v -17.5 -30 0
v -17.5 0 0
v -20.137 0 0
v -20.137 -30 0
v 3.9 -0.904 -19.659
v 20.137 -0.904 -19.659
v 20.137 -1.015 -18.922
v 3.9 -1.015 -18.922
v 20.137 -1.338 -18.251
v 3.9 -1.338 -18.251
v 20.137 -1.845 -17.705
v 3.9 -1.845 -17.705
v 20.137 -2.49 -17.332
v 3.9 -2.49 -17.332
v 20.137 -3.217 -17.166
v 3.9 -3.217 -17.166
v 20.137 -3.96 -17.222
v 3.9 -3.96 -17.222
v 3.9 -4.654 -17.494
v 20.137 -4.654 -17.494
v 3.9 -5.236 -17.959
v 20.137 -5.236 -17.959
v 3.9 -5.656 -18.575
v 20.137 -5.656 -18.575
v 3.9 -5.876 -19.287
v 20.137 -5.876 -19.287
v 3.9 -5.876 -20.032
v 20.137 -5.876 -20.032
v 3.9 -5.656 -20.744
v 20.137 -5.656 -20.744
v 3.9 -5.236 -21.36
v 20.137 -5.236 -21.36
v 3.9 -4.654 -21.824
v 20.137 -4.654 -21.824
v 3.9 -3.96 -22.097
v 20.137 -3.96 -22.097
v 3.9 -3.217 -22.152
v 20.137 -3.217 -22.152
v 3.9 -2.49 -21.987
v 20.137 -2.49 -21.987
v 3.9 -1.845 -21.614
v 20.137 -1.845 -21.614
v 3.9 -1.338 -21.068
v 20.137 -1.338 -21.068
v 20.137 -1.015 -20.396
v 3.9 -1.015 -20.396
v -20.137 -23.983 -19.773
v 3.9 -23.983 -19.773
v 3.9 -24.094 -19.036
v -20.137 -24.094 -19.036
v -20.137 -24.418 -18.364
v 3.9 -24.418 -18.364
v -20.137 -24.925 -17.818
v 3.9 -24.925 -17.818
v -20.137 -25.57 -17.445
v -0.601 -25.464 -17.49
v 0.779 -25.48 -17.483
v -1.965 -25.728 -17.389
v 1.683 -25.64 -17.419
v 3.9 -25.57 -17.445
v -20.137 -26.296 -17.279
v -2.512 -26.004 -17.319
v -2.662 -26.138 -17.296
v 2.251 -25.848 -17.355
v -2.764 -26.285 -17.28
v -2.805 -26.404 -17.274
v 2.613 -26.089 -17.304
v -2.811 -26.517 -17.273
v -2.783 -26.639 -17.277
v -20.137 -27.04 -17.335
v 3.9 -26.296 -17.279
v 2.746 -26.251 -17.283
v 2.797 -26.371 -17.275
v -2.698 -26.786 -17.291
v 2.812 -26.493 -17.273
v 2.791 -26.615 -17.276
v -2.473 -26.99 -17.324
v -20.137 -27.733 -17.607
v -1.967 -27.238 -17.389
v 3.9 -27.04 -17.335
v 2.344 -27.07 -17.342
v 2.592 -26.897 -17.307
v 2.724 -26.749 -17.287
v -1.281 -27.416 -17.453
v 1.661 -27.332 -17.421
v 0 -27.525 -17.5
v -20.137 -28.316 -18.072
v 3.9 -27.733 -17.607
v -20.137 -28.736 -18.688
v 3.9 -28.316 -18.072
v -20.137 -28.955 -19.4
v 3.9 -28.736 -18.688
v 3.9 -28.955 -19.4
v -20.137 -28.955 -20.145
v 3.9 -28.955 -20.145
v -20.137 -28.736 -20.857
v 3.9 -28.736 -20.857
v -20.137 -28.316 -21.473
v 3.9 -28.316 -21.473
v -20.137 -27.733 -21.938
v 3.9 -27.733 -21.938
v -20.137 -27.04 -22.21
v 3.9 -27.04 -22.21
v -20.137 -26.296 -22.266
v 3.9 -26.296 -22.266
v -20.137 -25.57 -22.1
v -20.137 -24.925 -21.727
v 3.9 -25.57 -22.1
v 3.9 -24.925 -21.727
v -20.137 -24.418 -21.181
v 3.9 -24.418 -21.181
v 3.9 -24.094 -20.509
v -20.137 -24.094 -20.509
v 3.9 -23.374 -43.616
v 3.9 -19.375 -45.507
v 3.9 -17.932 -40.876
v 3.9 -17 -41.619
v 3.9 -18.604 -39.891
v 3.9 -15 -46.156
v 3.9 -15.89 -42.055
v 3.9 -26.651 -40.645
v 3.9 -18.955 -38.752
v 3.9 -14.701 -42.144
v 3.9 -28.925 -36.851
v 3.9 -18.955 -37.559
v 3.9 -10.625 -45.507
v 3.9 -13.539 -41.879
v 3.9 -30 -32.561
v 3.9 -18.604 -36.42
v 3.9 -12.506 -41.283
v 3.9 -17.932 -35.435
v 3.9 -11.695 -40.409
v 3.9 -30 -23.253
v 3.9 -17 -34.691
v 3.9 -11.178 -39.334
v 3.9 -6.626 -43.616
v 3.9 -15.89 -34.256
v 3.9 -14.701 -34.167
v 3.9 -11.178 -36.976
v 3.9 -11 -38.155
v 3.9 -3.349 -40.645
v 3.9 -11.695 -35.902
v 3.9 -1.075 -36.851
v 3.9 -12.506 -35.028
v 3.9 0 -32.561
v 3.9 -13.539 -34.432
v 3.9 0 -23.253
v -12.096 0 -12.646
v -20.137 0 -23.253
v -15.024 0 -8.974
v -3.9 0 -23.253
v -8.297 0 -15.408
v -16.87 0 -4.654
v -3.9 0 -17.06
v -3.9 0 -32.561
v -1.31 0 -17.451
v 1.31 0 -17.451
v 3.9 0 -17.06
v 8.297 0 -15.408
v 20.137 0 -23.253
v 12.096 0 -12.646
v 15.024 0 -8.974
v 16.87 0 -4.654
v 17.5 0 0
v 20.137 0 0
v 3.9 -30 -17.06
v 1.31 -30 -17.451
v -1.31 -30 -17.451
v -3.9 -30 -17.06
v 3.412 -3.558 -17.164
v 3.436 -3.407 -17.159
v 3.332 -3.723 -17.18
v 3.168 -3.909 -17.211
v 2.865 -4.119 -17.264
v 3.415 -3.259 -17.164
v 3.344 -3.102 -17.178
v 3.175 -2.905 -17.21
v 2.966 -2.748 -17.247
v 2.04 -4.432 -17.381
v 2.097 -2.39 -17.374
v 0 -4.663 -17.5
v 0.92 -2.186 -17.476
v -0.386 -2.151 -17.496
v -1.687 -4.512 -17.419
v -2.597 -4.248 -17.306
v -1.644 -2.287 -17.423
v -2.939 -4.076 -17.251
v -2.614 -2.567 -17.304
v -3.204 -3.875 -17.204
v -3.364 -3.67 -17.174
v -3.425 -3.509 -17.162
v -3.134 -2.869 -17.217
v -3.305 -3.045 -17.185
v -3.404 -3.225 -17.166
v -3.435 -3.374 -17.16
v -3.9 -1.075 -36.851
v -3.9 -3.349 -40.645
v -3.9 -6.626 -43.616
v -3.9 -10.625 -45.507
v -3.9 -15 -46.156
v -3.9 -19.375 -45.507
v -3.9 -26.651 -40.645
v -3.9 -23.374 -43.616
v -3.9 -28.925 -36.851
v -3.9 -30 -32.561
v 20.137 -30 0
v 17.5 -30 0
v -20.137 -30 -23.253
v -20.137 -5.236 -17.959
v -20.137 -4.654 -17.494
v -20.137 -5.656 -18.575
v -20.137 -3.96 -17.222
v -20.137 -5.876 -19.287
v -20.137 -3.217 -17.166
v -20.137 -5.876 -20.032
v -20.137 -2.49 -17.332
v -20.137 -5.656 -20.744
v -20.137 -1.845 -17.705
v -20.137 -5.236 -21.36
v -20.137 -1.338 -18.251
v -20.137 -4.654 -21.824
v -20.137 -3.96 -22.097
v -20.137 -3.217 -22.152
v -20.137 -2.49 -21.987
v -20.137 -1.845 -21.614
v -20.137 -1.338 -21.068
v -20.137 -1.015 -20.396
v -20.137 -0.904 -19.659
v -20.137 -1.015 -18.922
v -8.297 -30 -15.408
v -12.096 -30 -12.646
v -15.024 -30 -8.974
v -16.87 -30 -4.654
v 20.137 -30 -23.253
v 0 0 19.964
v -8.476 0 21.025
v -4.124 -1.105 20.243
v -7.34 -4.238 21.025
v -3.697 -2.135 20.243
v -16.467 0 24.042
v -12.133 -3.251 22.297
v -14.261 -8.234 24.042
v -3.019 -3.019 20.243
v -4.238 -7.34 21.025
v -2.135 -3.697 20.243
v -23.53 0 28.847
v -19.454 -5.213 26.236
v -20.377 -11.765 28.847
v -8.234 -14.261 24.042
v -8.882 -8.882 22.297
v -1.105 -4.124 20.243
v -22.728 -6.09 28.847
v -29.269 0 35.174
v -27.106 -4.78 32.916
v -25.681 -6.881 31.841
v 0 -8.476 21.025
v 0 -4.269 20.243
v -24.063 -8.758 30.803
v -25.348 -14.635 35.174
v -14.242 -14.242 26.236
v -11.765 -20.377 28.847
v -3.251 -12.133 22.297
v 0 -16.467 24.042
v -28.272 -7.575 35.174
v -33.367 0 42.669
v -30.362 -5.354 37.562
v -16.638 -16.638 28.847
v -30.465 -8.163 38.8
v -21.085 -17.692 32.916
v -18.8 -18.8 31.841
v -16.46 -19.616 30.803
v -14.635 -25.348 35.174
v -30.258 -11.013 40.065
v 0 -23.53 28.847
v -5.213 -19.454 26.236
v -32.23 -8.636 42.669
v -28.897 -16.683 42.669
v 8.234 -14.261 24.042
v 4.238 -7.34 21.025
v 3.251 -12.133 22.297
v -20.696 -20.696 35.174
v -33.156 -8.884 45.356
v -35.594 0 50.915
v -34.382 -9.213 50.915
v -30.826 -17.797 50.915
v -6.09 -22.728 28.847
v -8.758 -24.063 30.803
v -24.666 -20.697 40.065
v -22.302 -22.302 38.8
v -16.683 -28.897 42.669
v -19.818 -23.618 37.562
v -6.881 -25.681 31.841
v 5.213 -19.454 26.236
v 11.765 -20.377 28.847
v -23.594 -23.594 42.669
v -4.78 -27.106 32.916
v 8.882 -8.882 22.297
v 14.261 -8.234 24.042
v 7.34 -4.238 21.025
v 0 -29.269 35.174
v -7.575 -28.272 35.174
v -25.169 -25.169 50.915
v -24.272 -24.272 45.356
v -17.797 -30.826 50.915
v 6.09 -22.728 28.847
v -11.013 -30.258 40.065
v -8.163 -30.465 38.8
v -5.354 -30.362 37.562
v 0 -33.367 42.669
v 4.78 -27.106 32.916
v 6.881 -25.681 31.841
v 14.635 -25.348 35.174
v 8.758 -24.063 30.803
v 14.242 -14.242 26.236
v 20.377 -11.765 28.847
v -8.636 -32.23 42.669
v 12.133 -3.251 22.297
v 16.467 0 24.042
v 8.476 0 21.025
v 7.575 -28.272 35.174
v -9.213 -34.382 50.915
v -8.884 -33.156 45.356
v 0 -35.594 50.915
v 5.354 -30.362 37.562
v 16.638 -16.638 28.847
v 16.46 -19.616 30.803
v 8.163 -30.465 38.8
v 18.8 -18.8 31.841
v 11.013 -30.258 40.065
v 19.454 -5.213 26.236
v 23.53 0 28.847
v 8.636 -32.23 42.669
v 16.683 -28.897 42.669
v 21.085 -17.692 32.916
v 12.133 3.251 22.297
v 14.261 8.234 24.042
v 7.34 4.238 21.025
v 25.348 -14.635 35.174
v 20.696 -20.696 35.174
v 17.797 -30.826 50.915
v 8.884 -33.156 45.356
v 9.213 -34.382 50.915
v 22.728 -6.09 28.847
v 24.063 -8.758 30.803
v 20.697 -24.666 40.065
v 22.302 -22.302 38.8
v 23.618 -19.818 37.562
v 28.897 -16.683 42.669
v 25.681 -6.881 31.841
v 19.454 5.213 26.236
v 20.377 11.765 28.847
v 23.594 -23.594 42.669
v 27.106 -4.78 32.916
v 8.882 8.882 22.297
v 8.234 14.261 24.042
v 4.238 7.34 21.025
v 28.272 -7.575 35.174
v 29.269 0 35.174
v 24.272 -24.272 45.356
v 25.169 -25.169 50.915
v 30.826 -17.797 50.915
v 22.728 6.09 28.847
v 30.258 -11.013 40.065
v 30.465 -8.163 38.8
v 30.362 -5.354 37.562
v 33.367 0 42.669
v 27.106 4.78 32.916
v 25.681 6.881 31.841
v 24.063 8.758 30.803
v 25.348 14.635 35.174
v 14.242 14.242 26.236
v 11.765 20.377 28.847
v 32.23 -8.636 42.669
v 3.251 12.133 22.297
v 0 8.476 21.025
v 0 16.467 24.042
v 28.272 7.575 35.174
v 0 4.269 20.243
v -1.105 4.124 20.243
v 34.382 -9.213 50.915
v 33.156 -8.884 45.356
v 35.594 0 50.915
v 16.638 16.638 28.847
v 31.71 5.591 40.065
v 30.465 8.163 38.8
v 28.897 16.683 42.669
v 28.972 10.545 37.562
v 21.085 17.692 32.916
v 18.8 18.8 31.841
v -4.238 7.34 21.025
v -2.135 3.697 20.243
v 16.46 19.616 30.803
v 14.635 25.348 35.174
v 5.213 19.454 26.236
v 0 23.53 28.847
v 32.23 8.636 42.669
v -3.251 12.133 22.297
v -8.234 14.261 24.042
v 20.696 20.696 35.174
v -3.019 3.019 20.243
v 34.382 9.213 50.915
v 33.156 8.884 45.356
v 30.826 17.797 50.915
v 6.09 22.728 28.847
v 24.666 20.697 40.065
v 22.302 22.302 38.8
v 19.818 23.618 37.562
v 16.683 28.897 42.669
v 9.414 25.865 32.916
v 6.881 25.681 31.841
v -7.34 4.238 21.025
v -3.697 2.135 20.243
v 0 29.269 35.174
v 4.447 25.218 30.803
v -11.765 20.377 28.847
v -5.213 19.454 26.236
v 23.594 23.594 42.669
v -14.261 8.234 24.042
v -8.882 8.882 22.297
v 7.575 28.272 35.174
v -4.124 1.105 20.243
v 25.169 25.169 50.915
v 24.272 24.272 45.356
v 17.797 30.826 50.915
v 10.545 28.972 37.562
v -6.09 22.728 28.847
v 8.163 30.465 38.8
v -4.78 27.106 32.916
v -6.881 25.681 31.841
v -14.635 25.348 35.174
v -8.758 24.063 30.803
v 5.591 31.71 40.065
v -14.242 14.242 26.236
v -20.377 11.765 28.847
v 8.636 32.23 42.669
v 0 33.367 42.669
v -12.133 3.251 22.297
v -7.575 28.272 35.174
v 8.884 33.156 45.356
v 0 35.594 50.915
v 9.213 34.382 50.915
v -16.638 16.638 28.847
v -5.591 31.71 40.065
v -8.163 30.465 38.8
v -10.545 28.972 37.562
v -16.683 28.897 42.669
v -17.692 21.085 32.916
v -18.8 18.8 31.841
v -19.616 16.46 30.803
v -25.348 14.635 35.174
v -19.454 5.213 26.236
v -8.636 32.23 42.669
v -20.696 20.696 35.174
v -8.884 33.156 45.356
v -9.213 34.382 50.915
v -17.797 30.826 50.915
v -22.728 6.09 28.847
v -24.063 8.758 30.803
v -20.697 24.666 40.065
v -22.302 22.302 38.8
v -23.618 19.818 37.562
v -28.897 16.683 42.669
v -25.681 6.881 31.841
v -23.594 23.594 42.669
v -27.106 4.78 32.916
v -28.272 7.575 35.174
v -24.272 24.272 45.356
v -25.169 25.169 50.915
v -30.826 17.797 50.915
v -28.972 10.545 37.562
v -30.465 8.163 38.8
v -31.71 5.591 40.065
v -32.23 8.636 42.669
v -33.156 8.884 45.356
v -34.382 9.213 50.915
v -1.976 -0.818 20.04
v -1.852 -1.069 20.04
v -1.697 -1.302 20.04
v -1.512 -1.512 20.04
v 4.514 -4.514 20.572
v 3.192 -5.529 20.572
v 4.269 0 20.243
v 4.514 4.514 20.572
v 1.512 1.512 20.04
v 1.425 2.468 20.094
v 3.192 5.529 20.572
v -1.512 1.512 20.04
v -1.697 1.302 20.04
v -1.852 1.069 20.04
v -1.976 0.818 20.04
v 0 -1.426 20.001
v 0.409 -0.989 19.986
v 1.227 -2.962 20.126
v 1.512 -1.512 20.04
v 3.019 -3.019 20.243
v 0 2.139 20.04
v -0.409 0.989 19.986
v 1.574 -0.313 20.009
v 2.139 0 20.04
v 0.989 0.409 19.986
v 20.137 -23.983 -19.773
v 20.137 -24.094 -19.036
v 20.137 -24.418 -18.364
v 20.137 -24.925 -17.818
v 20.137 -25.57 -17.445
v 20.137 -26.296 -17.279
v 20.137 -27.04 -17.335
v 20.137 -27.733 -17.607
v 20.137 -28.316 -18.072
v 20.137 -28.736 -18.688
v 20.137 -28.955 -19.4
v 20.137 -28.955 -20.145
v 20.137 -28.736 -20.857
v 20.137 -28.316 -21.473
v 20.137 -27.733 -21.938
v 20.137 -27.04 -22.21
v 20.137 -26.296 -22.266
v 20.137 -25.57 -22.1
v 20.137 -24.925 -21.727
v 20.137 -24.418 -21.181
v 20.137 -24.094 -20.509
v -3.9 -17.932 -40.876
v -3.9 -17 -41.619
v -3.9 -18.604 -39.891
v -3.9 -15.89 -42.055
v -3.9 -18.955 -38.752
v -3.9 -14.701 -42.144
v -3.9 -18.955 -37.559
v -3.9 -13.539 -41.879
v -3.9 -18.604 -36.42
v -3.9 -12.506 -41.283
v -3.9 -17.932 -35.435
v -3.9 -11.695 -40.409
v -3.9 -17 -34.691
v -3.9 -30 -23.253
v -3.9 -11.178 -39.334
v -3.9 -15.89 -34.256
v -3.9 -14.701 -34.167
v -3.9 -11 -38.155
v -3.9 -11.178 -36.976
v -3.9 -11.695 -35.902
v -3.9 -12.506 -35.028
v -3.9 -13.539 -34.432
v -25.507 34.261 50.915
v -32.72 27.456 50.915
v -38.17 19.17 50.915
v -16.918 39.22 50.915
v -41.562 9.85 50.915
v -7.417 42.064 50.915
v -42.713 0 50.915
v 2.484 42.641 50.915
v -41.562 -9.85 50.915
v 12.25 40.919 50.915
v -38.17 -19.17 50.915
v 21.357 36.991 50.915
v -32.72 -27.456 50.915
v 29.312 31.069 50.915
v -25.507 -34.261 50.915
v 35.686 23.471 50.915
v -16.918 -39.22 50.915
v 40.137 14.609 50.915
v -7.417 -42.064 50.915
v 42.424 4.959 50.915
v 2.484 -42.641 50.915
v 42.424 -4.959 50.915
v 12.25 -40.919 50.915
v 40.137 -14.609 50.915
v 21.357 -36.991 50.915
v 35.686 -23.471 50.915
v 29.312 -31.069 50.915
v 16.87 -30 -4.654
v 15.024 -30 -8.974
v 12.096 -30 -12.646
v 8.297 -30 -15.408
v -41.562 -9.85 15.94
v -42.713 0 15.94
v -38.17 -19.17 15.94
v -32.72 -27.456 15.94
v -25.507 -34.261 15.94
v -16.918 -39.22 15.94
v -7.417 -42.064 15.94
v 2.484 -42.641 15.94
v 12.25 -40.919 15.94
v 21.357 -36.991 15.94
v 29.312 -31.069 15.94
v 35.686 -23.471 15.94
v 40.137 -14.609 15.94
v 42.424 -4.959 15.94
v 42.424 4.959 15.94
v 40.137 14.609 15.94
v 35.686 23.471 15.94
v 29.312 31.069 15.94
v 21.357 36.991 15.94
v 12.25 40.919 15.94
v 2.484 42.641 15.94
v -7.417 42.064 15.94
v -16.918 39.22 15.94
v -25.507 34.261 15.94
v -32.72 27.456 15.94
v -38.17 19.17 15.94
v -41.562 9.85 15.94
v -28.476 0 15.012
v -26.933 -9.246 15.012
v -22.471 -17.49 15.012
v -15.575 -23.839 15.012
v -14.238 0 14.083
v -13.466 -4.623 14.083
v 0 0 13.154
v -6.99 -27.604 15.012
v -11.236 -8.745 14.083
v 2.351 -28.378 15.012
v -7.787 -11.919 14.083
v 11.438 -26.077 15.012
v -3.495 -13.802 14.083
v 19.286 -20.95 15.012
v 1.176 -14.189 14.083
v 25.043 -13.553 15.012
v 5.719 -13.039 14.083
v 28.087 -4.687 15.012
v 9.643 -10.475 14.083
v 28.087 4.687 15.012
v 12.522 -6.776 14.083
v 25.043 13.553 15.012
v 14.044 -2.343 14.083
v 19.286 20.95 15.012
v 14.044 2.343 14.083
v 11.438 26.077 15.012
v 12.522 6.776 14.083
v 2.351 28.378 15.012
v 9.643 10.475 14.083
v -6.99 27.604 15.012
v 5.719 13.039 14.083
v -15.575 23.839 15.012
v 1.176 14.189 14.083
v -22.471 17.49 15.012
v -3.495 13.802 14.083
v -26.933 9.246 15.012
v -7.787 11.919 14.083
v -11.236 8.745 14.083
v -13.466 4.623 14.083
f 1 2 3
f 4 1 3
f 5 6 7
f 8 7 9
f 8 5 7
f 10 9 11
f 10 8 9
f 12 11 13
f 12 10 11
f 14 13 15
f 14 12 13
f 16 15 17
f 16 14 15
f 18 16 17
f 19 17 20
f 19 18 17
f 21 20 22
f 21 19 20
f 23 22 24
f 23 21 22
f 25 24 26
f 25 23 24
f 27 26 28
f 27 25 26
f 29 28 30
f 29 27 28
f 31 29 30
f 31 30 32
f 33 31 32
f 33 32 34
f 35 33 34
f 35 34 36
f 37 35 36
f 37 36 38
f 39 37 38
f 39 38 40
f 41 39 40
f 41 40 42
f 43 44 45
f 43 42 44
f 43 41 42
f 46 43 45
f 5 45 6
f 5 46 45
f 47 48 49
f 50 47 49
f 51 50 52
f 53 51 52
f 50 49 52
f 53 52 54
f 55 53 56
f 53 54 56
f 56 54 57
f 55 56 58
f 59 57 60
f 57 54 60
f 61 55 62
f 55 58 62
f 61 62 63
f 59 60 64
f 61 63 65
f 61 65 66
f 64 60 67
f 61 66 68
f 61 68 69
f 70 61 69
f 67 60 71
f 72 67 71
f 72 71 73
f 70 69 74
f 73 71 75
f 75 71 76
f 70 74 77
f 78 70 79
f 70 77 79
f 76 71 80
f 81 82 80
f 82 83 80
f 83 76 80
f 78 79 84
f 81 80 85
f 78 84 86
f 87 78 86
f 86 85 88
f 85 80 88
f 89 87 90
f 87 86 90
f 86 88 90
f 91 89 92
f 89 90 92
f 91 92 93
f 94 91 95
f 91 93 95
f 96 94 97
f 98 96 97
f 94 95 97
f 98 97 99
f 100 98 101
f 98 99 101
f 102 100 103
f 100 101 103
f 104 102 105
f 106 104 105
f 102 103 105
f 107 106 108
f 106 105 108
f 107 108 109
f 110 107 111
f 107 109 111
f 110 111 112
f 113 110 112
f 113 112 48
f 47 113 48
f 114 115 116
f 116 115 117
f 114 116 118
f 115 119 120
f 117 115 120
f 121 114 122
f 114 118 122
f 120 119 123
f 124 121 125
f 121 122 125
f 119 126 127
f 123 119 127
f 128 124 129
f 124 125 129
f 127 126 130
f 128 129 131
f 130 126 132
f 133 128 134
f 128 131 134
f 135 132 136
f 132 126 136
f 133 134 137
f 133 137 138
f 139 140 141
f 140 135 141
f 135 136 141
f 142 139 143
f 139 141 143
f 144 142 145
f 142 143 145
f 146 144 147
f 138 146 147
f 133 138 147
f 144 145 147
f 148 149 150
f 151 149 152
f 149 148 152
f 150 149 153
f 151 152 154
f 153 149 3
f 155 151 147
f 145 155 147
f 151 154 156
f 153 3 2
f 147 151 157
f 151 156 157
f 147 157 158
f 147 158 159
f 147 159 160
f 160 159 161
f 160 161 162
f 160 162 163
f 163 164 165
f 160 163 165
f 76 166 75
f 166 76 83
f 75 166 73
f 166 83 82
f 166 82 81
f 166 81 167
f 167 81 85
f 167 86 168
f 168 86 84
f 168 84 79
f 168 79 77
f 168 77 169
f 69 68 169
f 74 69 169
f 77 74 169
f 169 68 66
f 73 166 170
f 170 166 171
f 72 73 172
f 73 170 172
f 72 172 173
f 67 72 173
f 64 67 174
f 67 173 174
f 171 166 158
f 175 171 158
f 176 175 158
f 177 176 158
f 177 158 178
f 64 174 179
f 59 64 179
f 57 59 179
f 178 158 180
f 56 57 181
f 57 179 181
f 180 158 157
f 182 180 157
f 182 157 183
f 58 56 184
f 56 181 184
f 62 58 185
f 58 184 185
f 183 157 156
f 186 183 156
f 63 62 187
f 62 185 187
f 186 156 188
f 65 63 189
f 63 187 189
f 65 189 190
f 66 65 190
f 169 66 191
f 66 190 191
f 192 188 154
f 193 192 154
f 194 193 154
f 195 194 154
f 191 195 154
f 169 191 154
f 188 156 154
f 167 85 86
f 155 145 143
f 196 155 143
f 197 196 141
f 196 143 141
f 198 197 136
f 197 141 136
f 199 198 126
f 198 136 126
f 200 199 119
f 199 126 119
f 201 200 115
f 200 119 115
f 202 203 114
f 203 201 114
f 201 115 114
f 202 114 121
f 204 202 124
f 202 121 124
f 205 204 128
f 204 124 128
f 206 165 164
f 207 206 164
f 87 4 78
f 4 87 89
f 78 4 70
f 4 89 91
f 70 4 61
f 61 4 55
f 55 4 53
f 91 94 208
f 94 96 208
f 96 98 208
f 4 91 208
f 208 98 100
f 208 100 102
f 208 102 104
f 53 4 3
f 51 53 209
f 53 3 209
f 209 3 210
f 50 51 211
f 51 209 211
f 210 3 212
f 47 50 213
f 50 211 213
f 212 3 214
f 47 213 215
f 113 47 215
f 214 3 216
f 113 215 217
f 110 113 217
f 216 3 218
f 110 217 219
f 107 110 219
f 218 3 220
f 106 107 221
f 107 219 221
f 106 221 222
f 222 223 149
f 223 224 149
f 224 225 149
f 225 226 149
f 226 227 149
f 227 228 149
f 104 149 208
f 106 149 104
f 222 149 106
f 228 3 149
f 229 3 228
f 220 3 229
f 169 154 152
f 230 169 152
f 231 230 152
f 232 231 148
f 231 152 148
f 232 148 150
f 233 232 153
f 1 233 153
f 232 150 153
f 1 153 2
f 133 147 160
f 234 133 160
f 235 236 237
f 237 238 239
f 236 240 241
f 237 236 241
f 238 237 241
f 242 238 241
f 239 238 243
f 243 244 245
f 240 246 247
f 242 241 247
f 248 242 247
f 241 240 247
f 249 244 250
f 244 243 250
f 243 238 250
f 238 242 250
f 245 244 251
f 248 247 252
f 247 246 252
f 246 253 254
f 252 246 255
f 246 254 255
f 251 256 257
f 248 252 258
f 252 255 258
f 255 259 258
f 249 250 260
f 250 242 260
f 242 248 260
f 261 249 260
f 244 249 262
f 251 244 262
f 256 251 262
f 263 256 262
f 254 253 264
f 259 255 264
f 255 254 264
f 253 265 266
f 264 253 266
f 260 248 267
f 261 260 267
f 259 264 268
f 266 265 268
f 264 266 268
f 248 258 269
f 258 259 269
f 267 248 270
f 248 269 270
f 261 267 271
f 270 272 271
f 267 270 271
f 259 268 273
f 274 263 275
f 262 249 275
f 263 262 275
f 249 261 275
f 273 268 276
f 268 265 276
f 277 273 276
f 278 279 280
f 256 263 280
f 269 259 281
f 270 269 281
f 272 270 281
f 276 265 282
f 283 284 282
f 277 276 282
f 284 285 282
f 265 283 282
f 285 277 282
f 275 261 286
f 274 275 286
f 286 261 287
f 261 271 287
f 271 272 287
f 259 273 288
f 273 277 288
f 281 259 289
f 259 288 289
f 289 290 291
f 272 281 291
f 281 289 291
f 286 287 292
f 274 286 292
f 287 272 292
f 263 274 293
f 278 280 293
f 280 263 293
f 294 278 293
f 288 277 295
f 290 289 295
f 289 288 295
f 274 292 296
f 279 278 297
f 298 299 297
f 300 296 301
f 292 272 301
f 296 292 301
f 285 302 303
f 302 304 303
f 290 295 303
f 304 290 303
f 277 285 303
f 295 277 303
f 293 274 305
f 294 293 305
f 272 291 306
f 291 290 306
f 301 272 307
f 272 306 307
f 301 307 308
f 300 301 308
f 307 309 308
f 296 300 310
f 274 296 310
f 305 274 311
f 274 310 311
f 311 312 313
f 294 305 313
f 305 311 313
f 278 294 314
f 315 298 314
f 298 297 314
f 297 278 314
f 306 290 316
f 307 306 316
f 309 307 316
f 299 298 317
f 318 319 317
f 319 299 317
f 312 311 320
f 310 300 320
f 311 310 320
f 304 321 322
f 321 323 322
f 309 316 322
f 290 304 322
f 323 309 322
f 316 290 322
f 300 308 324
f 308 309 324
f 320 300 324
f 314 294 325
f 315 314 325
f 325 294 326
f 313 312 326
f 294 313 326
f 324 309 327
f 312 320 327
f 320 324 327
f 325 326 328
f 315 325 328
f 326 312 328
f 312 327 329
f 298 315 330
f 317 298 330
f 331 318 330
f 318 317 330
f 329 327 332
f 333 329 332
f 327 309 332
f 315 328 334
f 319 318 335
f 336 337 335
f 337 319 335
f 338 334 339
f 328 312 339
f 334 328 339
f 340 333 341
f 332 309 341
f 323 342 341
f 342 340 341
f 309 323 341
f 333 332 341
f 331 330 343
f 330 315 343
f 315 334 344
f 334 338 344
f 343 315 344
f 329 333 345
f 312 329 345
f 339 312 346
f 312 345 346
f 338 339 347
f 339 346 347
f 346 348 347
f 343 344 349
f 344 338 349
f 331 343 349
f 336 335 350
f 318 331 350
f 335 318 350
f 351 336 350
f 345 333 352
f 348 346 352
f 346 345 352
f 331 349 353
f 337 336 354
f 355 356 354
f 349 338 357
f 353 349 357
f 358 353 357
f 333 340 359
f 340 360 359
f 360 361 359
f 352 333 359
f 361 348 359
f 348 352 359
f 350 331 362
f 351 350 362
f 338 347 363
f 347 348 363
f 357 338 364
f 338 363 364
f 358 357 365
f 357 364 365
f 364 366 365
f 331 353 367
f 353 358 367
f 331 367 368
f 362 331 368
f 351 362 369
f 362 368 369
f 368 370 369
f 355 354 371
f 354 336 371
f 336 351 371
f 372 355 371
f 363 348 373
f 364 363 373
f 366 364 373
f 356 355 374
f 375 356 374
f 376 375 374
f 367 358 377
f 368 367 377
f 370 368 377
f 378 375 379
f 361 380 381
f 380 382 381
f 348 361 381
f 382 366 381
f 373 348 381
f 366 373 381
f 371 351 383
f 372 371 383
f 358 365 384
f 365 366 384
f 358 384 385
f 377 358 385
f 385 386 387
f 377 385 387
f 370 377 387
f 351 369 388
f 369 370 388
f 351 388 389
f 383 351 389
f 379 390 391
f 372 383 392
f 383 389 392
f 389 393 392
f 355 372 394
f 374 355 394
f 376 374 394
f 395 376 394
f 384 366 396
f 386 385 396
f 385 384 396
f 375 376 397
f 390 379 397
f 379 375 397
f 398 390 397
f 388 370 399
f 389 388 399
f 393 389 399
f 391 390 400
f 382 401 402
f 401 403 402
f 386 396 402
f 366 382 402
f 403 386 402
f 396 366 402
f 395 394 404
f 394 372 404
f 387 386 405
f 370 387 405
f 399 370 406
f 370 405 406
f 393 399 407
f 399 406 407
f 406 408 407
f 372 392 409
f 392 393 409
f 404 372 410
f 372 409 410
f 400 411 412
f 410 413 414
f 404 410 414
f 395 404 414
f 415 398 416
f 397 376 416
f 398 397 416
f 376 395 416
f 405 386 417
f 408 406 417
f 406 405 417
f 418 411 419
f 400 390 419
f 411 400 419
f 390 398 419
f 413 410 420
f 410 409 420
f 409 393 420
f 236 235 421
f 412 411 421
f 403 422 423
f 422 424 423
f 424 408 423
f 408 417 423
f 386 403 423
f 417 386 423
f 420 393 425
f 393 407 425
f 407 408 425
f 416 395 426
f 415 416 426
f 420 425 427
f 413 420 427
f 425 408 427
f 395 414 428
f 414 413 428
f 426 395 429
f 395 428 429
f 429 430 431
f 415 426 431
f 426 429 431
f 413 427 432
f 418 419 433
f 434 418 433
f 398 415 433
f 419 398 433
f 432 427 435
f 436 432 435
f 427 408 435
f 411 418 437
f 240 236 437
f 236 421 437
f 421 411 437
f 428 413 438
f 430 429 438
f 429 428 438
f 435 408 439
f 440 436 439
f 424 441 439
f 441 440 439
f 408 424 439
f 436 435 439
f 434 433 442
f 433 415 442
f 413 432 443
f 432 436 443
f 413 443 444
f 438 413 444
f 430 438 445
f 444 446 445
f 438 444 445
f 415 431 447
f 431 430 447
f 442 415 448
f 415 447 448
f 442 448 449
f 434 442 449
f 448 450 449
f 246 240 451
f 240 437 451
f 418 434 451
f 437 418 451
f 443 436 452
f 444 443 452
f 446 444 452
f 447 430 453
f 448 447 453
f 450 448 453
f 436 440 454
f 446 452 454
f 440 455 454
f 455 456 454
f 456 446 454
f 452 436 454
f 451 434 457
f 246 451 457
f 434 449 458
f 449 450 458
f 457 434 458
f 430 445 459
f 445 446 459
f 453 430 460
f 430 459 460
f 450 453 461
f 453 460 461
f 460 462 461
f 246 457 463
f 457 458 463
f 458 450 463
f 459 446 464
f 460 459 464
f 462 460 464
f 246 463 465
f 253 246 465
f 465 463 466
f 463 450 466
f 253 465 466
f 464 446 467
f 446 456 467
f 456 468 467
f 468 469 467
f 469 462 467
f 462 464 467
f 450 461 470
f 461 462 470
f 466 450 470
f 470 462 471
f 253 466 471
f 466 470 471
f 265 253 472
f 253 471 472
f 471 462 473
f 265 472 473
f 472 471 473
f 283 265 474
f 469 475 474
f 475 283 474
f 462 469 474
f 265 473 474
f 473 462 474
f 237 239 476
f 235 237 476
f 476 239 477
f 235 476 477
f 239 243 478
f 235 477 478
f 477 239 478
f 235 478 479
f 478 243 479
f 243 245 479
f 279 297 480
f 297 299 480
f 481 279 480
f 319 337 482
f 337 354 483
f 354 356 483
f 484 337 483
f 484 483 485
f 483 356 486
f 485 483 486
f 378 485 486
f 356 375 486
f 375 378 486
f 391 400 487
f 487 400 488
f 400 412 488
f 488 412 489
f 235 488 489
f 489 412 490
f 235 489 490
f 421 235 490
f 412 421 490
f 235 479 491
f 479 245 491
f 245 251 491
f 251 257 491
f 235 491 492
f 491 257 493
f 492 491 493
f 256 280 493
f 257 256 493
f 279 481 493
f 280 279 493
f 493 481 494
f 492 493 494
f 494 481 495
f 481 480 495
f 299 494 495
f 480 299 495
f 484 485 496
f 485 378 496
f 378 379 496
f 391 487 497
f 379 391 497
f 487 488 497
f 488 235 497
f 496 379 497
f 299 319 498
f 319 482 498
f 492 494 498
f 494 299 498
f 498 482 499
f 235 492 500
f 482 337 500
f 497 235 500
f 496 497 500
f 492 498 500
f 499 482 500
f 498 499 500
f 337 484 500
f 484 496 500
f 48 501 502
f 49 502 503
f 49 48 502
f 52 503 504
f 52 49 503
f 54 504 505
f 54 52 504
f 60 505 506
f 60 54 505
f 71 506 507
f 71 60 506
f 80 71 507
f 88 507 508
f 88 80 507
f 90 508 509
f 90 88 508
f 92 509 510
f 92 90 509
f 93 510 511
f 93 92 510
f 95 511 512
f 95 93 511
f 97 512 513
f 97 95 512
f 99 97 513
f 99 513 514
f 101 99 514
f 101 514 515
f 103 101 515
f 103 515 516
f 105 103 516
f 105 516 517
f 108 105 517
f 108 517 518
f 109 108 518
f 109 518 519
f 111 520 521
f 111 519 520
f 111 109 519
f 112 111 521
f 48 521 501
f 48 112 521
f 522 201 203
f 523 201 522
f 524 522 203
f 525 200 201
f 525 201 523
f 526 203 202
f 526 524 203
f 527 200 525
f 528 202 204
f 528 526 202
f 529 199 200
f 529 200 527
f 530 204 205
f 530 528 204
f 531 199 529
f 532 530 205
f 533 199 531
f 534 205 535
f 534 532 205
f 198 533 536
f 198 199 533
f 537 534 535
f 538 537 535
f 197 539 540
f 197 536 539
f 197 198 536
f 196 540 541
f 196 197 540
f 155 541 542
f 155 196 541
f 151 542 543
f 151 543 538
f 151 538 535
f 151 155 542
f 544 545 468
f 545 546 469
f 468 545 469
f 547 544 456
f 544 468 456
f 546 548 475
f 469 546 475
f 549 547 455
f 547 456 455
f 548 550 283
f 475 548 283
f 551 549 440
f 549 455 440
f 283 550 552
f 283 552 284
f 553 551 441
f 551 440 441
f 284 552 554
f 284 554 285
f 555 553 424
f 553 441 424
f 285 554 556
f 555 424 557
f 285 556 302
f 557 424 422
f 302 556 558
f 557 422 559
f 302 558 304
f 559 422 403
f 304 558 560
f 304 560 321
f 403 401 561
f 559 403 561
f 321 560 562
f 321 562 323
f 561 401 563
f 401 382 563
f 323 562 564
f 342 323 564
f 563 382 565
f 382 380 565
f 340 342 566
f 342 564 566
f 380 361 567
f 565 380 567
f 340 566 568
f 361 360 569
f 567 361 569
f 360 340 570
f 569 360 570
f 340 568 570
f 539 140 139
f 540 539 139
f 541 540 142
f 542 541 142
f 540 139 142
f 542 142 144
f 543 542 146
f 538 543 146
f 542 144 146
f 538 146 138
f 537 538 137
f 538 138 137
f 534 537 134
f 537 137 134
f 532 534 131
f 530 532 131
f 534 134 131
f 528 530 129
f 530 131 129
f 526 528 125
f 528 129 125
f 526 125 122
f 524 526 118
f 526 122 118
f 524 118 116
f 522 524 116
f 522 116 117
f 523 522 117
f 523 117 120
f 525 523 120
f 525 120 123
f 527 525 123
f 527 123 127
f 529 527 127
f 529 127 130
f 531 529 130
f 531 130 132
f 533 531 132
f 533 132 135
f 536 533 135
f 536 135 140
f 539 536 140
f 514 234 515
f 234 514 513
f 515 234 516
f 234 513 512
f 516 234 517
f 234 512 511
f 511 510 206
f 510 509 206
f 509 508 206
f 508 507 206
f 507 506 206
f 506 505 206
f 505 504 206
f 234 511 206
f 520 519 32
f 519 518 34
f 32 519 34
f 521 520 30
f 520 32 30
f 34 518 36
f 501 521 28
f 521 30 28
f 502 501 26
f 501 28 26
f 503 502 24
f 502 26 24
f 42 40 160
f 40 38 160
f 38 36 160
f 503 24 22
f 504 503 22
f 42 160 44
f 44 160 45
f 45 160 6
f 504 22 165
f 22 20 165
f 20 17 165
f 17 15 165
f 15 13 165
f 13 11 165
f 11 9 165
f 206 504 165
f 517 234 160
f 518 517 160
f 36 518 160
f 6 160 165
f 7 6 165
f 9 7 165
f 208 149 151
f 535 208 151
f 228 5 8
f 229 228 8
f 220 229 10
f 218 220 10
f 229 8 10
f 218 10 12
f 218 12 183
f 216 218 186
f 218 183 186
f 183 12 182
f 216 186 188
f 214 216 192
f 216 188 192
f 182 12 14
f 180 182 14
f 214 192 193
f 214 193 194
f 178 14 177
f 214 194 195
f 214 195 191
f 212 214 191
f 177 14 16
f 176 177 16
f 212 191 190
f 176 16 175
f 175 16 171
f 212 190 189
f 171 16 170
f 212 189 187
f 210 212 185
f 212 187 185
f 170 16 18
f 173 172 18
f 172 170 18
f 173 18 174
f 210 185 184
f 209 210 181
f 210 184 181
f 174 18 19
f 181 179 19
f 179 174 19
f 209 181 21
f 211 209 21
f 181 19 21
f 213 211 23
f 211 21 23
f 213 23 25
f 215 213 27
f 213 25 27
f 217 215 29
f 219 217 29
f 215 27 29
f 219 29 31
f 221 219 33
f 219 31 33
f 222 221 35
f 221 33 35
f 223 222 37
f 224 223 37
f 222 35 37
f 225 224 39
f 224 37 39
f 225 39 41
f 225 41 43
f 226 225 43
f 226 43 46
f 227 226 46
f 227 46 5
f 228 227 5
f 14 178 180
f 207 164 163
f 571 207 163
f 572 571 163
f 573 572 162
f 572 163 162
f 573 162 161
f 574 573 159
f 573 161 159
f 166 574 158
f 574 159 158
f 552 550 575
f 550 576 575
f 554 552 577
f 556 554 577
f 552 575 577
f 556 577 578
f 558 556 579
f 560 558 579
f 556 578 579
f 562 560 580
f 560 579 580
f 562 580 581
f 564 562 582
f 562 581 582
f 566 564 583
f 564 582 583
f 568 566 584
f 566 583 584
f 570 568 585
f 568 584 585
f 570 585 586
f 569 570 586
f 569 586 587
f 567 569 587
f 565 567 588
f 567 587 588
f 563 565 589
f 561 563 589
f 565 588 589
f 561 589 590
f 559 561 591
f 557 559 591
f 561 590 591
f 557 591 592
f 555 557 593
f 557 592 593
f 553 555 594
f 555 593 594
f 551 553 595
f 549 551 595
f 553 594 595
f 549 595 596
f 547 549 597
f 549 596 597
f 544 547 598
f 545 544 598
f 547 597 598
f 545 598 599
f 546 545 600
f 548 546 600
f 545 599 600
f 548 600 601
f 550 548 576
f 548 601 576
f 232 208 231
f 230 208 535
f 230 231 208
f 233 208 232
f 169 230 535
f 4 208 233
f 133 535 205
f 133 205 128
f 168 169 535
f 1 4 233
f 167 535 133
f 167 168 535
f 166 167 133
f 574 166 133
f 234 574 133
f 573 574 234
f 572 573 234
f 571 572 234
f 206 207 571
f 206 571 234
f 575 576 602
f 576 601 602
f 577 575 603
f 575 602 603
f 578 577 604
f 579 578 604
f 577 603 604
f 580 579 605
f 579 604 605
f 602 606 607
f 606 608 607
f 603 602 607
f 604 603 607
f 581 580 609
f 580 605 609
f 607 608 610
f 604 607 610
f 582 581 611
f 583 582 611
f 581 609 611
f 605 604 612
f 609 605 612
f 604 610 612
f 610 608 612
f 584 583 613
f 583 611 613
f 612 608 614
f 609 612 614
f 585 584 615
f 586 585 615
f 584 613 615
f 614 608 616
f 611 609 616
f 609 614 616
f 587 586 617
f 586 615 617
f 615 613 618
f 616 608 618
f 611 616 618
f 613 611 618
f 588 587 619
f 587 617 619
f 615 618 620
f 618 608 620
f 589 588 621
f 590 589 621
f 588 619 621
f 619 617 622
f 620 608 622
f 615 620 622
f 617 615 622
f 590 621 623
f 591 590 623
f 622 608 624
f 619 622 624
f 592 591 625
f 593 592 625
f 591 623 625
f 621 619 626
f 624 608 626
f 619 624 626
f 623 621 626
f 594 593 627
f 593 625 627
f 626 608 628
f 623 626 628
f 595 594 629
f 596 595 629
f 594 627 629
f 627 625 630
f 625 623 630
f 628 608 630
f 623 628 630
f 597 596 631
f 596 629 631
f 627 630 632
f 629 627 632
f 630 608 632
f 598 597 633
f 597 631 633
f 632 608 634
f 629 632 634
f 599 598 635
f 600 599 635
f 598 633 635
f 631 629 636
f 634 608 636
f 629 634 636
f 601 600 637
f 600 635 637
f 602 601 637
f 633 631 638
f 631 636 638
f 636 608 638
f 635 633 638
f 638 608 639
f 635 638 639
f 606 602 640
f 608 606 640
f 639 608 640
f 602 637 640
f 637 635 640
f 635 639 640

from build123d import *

# Parameters (mm, degrees)
F0_W          = 7.8
F0_H          = 23.0137296021
F1_DEPTH      = 30
F3_DEPTH      = 24.0380157301
F4_R          = 4
F4_R_2        = 2.5
F5_DEPTH      = 24.0380157301
F5_DEPTH_BACK = 16.2380157301


with BuildPart() as f1:
    # F0 (on Front) → F1 (new body)
    with BuildSketch(Plane.XZ):
        with BuildLine():
            Line((20.1370157301, 0), (20, 0))
            ThreePointArc((20, 0), (15.4596248337, -12.6885775404), (3.9, -19.6160648449))
            Line((3.9, -19.6160648449), (3.9, -23.2534594834))
            Line((3.9, -23.2534594834), (20.1370157301, -23.2534594834))
            Line((20.1370157301, -23.2534594834), (20.1370157301, 0))
        make_face()
        with BuildLine():
            Line((20, 0), (17.5, 0))
            ThreePointArc((17.5, 0), (13.6839321834, -10.9087121146), (3.9, -17.0598944897))
            Line((3.9, -17.0598944897), (3.9, -19.6160648449))
            ThreePointArc((3.9, -19.6160648449), (15.4596248337, -12.6885775404), (20, 0))
        make_face()
        with BuildLine():
            Line((3.9, -19.6160648449), (3.9, -17.0598944897))
            ThreePointArc((3.9, -17.0598944897), (0, -17.5), (-3.9, -17.0598944897))
            Line((-3.9, -17.0598944897), (-3.9, -19.6160648449))
            ThreePointArc((-3.9, -19.6160648449), (0, -20), (3.9, -19.6160648449))
        make_face()
        with BuildLine():
            Line((-3.9, -19.6160648449), (-3.9, -17.0598944897))
            ThreePointArc((-3.9, -17.0598944897), (-13.6839321834, -10.9087121146), (-17.5, 0))
            Line((-17.5, 0), (-20, 0))
            ThreePointArc((-20, 0), (-15.4596248337, -12.6885775404), (-3.9, -19.6160648449))
        make_face()
        with BuildLine():
            Line((-3.9, -23.2534594834), (-3.9, -19.6160648449))
            ThreePointArc((-3.9, -19.6160648449), (-15.4596248337, -12.6885775404), (-20, 0))
            Line((-20, 0), (-20.1370157301, 0))
            Line((-20.1370157301, 0), (-20.1370157301, -23.2534594834))
            Line((-20.1370157301, -23.2534594834), (-3.9, -23.2534594834))
        make_face()
        with BuildLine():
            Line((3.9, -23.2534594834), (3.9, -19.6160648449))
            ThreePointArc((3.9, -19.6160648449), (0, -20), (-3.9, -19.6160648449))
            Line((-3.9, -19.6160648449), (-3.9, -23.2534594834))
            Line((-3.9, -23.2534594834), (3.9, -23.2534594834))
        make_face()
        with Locations((0, -34.7603242844)):
            Rectangle(F0_W, F0_H)
    extrude(amount=F1_DEPTH)

    # F2 (on face) → F3 (cut, through all)
    with BuildSketch(Plane.YZ.offset(3.9)):
        with BuildLine():
            Line((0, -46.2671890855), (0, -32.5605841978))
            ThreePointArc((0, -32.5605841978), (-15.0000202292, -46.1559676511), (-30, -32.5605395594))
            Line((-30, -32.5605395594), (-30, -46.2671890855))
            Line((-30, -46.2671890855), (0, -46.2671890855))
        make_face()
    extrude(amount=-F3_DEPTH, mode=Mode.SUBTRACT)

    # F4 (on face) → F5 (cut, two sides)
    with BuildSketch(Plane.YZ.offset(3.9)) as f5_sk:
        with Locations((-15.0000202292, -38.1553545594)):
            Circle(F4_R)
        with Locations((-26.4832824469, -19.7725053877)):
            Circle(F4_R_2)
        with Locations((-3.4035816789, -19.6593701839)):
            Circle(F4_R_2)
    extrude(amount=-F5_DEPTH, mode=Mode.SUBTRACT)
    extrude(f5_sk.sketch, amount=F5_DEPTH_BACK, mode=Mode.SUBTRACT)


with BuildPart() as f7:
    # F6 (on Front) → F7 (revolve)
    with BuildSketch(Plane.XZ):
        with BuildLine():
            ThreePointArc((0, 19.9638102204), (-23.5296044776, 28.8473619788), (-35.5943925679, 50.915453583))
            Line((-35.5943925679, 50.915453583), (-42.7132695913, 50.915453583))
            Line((-42.7132695913, 50.915453583), (-42.7132695913, 15.9400962293))
            Line((-42.7132695913, 15.9400962293), (0, 13.1544489413))
            Line((0, 13.1544489413), (0, 19.9638102204))
        make_face()
    revolve(axis=Axis((0, 0, 16.5591295809), (0, 0, 1)))


solid = Compound([f1.part, f7.part])
